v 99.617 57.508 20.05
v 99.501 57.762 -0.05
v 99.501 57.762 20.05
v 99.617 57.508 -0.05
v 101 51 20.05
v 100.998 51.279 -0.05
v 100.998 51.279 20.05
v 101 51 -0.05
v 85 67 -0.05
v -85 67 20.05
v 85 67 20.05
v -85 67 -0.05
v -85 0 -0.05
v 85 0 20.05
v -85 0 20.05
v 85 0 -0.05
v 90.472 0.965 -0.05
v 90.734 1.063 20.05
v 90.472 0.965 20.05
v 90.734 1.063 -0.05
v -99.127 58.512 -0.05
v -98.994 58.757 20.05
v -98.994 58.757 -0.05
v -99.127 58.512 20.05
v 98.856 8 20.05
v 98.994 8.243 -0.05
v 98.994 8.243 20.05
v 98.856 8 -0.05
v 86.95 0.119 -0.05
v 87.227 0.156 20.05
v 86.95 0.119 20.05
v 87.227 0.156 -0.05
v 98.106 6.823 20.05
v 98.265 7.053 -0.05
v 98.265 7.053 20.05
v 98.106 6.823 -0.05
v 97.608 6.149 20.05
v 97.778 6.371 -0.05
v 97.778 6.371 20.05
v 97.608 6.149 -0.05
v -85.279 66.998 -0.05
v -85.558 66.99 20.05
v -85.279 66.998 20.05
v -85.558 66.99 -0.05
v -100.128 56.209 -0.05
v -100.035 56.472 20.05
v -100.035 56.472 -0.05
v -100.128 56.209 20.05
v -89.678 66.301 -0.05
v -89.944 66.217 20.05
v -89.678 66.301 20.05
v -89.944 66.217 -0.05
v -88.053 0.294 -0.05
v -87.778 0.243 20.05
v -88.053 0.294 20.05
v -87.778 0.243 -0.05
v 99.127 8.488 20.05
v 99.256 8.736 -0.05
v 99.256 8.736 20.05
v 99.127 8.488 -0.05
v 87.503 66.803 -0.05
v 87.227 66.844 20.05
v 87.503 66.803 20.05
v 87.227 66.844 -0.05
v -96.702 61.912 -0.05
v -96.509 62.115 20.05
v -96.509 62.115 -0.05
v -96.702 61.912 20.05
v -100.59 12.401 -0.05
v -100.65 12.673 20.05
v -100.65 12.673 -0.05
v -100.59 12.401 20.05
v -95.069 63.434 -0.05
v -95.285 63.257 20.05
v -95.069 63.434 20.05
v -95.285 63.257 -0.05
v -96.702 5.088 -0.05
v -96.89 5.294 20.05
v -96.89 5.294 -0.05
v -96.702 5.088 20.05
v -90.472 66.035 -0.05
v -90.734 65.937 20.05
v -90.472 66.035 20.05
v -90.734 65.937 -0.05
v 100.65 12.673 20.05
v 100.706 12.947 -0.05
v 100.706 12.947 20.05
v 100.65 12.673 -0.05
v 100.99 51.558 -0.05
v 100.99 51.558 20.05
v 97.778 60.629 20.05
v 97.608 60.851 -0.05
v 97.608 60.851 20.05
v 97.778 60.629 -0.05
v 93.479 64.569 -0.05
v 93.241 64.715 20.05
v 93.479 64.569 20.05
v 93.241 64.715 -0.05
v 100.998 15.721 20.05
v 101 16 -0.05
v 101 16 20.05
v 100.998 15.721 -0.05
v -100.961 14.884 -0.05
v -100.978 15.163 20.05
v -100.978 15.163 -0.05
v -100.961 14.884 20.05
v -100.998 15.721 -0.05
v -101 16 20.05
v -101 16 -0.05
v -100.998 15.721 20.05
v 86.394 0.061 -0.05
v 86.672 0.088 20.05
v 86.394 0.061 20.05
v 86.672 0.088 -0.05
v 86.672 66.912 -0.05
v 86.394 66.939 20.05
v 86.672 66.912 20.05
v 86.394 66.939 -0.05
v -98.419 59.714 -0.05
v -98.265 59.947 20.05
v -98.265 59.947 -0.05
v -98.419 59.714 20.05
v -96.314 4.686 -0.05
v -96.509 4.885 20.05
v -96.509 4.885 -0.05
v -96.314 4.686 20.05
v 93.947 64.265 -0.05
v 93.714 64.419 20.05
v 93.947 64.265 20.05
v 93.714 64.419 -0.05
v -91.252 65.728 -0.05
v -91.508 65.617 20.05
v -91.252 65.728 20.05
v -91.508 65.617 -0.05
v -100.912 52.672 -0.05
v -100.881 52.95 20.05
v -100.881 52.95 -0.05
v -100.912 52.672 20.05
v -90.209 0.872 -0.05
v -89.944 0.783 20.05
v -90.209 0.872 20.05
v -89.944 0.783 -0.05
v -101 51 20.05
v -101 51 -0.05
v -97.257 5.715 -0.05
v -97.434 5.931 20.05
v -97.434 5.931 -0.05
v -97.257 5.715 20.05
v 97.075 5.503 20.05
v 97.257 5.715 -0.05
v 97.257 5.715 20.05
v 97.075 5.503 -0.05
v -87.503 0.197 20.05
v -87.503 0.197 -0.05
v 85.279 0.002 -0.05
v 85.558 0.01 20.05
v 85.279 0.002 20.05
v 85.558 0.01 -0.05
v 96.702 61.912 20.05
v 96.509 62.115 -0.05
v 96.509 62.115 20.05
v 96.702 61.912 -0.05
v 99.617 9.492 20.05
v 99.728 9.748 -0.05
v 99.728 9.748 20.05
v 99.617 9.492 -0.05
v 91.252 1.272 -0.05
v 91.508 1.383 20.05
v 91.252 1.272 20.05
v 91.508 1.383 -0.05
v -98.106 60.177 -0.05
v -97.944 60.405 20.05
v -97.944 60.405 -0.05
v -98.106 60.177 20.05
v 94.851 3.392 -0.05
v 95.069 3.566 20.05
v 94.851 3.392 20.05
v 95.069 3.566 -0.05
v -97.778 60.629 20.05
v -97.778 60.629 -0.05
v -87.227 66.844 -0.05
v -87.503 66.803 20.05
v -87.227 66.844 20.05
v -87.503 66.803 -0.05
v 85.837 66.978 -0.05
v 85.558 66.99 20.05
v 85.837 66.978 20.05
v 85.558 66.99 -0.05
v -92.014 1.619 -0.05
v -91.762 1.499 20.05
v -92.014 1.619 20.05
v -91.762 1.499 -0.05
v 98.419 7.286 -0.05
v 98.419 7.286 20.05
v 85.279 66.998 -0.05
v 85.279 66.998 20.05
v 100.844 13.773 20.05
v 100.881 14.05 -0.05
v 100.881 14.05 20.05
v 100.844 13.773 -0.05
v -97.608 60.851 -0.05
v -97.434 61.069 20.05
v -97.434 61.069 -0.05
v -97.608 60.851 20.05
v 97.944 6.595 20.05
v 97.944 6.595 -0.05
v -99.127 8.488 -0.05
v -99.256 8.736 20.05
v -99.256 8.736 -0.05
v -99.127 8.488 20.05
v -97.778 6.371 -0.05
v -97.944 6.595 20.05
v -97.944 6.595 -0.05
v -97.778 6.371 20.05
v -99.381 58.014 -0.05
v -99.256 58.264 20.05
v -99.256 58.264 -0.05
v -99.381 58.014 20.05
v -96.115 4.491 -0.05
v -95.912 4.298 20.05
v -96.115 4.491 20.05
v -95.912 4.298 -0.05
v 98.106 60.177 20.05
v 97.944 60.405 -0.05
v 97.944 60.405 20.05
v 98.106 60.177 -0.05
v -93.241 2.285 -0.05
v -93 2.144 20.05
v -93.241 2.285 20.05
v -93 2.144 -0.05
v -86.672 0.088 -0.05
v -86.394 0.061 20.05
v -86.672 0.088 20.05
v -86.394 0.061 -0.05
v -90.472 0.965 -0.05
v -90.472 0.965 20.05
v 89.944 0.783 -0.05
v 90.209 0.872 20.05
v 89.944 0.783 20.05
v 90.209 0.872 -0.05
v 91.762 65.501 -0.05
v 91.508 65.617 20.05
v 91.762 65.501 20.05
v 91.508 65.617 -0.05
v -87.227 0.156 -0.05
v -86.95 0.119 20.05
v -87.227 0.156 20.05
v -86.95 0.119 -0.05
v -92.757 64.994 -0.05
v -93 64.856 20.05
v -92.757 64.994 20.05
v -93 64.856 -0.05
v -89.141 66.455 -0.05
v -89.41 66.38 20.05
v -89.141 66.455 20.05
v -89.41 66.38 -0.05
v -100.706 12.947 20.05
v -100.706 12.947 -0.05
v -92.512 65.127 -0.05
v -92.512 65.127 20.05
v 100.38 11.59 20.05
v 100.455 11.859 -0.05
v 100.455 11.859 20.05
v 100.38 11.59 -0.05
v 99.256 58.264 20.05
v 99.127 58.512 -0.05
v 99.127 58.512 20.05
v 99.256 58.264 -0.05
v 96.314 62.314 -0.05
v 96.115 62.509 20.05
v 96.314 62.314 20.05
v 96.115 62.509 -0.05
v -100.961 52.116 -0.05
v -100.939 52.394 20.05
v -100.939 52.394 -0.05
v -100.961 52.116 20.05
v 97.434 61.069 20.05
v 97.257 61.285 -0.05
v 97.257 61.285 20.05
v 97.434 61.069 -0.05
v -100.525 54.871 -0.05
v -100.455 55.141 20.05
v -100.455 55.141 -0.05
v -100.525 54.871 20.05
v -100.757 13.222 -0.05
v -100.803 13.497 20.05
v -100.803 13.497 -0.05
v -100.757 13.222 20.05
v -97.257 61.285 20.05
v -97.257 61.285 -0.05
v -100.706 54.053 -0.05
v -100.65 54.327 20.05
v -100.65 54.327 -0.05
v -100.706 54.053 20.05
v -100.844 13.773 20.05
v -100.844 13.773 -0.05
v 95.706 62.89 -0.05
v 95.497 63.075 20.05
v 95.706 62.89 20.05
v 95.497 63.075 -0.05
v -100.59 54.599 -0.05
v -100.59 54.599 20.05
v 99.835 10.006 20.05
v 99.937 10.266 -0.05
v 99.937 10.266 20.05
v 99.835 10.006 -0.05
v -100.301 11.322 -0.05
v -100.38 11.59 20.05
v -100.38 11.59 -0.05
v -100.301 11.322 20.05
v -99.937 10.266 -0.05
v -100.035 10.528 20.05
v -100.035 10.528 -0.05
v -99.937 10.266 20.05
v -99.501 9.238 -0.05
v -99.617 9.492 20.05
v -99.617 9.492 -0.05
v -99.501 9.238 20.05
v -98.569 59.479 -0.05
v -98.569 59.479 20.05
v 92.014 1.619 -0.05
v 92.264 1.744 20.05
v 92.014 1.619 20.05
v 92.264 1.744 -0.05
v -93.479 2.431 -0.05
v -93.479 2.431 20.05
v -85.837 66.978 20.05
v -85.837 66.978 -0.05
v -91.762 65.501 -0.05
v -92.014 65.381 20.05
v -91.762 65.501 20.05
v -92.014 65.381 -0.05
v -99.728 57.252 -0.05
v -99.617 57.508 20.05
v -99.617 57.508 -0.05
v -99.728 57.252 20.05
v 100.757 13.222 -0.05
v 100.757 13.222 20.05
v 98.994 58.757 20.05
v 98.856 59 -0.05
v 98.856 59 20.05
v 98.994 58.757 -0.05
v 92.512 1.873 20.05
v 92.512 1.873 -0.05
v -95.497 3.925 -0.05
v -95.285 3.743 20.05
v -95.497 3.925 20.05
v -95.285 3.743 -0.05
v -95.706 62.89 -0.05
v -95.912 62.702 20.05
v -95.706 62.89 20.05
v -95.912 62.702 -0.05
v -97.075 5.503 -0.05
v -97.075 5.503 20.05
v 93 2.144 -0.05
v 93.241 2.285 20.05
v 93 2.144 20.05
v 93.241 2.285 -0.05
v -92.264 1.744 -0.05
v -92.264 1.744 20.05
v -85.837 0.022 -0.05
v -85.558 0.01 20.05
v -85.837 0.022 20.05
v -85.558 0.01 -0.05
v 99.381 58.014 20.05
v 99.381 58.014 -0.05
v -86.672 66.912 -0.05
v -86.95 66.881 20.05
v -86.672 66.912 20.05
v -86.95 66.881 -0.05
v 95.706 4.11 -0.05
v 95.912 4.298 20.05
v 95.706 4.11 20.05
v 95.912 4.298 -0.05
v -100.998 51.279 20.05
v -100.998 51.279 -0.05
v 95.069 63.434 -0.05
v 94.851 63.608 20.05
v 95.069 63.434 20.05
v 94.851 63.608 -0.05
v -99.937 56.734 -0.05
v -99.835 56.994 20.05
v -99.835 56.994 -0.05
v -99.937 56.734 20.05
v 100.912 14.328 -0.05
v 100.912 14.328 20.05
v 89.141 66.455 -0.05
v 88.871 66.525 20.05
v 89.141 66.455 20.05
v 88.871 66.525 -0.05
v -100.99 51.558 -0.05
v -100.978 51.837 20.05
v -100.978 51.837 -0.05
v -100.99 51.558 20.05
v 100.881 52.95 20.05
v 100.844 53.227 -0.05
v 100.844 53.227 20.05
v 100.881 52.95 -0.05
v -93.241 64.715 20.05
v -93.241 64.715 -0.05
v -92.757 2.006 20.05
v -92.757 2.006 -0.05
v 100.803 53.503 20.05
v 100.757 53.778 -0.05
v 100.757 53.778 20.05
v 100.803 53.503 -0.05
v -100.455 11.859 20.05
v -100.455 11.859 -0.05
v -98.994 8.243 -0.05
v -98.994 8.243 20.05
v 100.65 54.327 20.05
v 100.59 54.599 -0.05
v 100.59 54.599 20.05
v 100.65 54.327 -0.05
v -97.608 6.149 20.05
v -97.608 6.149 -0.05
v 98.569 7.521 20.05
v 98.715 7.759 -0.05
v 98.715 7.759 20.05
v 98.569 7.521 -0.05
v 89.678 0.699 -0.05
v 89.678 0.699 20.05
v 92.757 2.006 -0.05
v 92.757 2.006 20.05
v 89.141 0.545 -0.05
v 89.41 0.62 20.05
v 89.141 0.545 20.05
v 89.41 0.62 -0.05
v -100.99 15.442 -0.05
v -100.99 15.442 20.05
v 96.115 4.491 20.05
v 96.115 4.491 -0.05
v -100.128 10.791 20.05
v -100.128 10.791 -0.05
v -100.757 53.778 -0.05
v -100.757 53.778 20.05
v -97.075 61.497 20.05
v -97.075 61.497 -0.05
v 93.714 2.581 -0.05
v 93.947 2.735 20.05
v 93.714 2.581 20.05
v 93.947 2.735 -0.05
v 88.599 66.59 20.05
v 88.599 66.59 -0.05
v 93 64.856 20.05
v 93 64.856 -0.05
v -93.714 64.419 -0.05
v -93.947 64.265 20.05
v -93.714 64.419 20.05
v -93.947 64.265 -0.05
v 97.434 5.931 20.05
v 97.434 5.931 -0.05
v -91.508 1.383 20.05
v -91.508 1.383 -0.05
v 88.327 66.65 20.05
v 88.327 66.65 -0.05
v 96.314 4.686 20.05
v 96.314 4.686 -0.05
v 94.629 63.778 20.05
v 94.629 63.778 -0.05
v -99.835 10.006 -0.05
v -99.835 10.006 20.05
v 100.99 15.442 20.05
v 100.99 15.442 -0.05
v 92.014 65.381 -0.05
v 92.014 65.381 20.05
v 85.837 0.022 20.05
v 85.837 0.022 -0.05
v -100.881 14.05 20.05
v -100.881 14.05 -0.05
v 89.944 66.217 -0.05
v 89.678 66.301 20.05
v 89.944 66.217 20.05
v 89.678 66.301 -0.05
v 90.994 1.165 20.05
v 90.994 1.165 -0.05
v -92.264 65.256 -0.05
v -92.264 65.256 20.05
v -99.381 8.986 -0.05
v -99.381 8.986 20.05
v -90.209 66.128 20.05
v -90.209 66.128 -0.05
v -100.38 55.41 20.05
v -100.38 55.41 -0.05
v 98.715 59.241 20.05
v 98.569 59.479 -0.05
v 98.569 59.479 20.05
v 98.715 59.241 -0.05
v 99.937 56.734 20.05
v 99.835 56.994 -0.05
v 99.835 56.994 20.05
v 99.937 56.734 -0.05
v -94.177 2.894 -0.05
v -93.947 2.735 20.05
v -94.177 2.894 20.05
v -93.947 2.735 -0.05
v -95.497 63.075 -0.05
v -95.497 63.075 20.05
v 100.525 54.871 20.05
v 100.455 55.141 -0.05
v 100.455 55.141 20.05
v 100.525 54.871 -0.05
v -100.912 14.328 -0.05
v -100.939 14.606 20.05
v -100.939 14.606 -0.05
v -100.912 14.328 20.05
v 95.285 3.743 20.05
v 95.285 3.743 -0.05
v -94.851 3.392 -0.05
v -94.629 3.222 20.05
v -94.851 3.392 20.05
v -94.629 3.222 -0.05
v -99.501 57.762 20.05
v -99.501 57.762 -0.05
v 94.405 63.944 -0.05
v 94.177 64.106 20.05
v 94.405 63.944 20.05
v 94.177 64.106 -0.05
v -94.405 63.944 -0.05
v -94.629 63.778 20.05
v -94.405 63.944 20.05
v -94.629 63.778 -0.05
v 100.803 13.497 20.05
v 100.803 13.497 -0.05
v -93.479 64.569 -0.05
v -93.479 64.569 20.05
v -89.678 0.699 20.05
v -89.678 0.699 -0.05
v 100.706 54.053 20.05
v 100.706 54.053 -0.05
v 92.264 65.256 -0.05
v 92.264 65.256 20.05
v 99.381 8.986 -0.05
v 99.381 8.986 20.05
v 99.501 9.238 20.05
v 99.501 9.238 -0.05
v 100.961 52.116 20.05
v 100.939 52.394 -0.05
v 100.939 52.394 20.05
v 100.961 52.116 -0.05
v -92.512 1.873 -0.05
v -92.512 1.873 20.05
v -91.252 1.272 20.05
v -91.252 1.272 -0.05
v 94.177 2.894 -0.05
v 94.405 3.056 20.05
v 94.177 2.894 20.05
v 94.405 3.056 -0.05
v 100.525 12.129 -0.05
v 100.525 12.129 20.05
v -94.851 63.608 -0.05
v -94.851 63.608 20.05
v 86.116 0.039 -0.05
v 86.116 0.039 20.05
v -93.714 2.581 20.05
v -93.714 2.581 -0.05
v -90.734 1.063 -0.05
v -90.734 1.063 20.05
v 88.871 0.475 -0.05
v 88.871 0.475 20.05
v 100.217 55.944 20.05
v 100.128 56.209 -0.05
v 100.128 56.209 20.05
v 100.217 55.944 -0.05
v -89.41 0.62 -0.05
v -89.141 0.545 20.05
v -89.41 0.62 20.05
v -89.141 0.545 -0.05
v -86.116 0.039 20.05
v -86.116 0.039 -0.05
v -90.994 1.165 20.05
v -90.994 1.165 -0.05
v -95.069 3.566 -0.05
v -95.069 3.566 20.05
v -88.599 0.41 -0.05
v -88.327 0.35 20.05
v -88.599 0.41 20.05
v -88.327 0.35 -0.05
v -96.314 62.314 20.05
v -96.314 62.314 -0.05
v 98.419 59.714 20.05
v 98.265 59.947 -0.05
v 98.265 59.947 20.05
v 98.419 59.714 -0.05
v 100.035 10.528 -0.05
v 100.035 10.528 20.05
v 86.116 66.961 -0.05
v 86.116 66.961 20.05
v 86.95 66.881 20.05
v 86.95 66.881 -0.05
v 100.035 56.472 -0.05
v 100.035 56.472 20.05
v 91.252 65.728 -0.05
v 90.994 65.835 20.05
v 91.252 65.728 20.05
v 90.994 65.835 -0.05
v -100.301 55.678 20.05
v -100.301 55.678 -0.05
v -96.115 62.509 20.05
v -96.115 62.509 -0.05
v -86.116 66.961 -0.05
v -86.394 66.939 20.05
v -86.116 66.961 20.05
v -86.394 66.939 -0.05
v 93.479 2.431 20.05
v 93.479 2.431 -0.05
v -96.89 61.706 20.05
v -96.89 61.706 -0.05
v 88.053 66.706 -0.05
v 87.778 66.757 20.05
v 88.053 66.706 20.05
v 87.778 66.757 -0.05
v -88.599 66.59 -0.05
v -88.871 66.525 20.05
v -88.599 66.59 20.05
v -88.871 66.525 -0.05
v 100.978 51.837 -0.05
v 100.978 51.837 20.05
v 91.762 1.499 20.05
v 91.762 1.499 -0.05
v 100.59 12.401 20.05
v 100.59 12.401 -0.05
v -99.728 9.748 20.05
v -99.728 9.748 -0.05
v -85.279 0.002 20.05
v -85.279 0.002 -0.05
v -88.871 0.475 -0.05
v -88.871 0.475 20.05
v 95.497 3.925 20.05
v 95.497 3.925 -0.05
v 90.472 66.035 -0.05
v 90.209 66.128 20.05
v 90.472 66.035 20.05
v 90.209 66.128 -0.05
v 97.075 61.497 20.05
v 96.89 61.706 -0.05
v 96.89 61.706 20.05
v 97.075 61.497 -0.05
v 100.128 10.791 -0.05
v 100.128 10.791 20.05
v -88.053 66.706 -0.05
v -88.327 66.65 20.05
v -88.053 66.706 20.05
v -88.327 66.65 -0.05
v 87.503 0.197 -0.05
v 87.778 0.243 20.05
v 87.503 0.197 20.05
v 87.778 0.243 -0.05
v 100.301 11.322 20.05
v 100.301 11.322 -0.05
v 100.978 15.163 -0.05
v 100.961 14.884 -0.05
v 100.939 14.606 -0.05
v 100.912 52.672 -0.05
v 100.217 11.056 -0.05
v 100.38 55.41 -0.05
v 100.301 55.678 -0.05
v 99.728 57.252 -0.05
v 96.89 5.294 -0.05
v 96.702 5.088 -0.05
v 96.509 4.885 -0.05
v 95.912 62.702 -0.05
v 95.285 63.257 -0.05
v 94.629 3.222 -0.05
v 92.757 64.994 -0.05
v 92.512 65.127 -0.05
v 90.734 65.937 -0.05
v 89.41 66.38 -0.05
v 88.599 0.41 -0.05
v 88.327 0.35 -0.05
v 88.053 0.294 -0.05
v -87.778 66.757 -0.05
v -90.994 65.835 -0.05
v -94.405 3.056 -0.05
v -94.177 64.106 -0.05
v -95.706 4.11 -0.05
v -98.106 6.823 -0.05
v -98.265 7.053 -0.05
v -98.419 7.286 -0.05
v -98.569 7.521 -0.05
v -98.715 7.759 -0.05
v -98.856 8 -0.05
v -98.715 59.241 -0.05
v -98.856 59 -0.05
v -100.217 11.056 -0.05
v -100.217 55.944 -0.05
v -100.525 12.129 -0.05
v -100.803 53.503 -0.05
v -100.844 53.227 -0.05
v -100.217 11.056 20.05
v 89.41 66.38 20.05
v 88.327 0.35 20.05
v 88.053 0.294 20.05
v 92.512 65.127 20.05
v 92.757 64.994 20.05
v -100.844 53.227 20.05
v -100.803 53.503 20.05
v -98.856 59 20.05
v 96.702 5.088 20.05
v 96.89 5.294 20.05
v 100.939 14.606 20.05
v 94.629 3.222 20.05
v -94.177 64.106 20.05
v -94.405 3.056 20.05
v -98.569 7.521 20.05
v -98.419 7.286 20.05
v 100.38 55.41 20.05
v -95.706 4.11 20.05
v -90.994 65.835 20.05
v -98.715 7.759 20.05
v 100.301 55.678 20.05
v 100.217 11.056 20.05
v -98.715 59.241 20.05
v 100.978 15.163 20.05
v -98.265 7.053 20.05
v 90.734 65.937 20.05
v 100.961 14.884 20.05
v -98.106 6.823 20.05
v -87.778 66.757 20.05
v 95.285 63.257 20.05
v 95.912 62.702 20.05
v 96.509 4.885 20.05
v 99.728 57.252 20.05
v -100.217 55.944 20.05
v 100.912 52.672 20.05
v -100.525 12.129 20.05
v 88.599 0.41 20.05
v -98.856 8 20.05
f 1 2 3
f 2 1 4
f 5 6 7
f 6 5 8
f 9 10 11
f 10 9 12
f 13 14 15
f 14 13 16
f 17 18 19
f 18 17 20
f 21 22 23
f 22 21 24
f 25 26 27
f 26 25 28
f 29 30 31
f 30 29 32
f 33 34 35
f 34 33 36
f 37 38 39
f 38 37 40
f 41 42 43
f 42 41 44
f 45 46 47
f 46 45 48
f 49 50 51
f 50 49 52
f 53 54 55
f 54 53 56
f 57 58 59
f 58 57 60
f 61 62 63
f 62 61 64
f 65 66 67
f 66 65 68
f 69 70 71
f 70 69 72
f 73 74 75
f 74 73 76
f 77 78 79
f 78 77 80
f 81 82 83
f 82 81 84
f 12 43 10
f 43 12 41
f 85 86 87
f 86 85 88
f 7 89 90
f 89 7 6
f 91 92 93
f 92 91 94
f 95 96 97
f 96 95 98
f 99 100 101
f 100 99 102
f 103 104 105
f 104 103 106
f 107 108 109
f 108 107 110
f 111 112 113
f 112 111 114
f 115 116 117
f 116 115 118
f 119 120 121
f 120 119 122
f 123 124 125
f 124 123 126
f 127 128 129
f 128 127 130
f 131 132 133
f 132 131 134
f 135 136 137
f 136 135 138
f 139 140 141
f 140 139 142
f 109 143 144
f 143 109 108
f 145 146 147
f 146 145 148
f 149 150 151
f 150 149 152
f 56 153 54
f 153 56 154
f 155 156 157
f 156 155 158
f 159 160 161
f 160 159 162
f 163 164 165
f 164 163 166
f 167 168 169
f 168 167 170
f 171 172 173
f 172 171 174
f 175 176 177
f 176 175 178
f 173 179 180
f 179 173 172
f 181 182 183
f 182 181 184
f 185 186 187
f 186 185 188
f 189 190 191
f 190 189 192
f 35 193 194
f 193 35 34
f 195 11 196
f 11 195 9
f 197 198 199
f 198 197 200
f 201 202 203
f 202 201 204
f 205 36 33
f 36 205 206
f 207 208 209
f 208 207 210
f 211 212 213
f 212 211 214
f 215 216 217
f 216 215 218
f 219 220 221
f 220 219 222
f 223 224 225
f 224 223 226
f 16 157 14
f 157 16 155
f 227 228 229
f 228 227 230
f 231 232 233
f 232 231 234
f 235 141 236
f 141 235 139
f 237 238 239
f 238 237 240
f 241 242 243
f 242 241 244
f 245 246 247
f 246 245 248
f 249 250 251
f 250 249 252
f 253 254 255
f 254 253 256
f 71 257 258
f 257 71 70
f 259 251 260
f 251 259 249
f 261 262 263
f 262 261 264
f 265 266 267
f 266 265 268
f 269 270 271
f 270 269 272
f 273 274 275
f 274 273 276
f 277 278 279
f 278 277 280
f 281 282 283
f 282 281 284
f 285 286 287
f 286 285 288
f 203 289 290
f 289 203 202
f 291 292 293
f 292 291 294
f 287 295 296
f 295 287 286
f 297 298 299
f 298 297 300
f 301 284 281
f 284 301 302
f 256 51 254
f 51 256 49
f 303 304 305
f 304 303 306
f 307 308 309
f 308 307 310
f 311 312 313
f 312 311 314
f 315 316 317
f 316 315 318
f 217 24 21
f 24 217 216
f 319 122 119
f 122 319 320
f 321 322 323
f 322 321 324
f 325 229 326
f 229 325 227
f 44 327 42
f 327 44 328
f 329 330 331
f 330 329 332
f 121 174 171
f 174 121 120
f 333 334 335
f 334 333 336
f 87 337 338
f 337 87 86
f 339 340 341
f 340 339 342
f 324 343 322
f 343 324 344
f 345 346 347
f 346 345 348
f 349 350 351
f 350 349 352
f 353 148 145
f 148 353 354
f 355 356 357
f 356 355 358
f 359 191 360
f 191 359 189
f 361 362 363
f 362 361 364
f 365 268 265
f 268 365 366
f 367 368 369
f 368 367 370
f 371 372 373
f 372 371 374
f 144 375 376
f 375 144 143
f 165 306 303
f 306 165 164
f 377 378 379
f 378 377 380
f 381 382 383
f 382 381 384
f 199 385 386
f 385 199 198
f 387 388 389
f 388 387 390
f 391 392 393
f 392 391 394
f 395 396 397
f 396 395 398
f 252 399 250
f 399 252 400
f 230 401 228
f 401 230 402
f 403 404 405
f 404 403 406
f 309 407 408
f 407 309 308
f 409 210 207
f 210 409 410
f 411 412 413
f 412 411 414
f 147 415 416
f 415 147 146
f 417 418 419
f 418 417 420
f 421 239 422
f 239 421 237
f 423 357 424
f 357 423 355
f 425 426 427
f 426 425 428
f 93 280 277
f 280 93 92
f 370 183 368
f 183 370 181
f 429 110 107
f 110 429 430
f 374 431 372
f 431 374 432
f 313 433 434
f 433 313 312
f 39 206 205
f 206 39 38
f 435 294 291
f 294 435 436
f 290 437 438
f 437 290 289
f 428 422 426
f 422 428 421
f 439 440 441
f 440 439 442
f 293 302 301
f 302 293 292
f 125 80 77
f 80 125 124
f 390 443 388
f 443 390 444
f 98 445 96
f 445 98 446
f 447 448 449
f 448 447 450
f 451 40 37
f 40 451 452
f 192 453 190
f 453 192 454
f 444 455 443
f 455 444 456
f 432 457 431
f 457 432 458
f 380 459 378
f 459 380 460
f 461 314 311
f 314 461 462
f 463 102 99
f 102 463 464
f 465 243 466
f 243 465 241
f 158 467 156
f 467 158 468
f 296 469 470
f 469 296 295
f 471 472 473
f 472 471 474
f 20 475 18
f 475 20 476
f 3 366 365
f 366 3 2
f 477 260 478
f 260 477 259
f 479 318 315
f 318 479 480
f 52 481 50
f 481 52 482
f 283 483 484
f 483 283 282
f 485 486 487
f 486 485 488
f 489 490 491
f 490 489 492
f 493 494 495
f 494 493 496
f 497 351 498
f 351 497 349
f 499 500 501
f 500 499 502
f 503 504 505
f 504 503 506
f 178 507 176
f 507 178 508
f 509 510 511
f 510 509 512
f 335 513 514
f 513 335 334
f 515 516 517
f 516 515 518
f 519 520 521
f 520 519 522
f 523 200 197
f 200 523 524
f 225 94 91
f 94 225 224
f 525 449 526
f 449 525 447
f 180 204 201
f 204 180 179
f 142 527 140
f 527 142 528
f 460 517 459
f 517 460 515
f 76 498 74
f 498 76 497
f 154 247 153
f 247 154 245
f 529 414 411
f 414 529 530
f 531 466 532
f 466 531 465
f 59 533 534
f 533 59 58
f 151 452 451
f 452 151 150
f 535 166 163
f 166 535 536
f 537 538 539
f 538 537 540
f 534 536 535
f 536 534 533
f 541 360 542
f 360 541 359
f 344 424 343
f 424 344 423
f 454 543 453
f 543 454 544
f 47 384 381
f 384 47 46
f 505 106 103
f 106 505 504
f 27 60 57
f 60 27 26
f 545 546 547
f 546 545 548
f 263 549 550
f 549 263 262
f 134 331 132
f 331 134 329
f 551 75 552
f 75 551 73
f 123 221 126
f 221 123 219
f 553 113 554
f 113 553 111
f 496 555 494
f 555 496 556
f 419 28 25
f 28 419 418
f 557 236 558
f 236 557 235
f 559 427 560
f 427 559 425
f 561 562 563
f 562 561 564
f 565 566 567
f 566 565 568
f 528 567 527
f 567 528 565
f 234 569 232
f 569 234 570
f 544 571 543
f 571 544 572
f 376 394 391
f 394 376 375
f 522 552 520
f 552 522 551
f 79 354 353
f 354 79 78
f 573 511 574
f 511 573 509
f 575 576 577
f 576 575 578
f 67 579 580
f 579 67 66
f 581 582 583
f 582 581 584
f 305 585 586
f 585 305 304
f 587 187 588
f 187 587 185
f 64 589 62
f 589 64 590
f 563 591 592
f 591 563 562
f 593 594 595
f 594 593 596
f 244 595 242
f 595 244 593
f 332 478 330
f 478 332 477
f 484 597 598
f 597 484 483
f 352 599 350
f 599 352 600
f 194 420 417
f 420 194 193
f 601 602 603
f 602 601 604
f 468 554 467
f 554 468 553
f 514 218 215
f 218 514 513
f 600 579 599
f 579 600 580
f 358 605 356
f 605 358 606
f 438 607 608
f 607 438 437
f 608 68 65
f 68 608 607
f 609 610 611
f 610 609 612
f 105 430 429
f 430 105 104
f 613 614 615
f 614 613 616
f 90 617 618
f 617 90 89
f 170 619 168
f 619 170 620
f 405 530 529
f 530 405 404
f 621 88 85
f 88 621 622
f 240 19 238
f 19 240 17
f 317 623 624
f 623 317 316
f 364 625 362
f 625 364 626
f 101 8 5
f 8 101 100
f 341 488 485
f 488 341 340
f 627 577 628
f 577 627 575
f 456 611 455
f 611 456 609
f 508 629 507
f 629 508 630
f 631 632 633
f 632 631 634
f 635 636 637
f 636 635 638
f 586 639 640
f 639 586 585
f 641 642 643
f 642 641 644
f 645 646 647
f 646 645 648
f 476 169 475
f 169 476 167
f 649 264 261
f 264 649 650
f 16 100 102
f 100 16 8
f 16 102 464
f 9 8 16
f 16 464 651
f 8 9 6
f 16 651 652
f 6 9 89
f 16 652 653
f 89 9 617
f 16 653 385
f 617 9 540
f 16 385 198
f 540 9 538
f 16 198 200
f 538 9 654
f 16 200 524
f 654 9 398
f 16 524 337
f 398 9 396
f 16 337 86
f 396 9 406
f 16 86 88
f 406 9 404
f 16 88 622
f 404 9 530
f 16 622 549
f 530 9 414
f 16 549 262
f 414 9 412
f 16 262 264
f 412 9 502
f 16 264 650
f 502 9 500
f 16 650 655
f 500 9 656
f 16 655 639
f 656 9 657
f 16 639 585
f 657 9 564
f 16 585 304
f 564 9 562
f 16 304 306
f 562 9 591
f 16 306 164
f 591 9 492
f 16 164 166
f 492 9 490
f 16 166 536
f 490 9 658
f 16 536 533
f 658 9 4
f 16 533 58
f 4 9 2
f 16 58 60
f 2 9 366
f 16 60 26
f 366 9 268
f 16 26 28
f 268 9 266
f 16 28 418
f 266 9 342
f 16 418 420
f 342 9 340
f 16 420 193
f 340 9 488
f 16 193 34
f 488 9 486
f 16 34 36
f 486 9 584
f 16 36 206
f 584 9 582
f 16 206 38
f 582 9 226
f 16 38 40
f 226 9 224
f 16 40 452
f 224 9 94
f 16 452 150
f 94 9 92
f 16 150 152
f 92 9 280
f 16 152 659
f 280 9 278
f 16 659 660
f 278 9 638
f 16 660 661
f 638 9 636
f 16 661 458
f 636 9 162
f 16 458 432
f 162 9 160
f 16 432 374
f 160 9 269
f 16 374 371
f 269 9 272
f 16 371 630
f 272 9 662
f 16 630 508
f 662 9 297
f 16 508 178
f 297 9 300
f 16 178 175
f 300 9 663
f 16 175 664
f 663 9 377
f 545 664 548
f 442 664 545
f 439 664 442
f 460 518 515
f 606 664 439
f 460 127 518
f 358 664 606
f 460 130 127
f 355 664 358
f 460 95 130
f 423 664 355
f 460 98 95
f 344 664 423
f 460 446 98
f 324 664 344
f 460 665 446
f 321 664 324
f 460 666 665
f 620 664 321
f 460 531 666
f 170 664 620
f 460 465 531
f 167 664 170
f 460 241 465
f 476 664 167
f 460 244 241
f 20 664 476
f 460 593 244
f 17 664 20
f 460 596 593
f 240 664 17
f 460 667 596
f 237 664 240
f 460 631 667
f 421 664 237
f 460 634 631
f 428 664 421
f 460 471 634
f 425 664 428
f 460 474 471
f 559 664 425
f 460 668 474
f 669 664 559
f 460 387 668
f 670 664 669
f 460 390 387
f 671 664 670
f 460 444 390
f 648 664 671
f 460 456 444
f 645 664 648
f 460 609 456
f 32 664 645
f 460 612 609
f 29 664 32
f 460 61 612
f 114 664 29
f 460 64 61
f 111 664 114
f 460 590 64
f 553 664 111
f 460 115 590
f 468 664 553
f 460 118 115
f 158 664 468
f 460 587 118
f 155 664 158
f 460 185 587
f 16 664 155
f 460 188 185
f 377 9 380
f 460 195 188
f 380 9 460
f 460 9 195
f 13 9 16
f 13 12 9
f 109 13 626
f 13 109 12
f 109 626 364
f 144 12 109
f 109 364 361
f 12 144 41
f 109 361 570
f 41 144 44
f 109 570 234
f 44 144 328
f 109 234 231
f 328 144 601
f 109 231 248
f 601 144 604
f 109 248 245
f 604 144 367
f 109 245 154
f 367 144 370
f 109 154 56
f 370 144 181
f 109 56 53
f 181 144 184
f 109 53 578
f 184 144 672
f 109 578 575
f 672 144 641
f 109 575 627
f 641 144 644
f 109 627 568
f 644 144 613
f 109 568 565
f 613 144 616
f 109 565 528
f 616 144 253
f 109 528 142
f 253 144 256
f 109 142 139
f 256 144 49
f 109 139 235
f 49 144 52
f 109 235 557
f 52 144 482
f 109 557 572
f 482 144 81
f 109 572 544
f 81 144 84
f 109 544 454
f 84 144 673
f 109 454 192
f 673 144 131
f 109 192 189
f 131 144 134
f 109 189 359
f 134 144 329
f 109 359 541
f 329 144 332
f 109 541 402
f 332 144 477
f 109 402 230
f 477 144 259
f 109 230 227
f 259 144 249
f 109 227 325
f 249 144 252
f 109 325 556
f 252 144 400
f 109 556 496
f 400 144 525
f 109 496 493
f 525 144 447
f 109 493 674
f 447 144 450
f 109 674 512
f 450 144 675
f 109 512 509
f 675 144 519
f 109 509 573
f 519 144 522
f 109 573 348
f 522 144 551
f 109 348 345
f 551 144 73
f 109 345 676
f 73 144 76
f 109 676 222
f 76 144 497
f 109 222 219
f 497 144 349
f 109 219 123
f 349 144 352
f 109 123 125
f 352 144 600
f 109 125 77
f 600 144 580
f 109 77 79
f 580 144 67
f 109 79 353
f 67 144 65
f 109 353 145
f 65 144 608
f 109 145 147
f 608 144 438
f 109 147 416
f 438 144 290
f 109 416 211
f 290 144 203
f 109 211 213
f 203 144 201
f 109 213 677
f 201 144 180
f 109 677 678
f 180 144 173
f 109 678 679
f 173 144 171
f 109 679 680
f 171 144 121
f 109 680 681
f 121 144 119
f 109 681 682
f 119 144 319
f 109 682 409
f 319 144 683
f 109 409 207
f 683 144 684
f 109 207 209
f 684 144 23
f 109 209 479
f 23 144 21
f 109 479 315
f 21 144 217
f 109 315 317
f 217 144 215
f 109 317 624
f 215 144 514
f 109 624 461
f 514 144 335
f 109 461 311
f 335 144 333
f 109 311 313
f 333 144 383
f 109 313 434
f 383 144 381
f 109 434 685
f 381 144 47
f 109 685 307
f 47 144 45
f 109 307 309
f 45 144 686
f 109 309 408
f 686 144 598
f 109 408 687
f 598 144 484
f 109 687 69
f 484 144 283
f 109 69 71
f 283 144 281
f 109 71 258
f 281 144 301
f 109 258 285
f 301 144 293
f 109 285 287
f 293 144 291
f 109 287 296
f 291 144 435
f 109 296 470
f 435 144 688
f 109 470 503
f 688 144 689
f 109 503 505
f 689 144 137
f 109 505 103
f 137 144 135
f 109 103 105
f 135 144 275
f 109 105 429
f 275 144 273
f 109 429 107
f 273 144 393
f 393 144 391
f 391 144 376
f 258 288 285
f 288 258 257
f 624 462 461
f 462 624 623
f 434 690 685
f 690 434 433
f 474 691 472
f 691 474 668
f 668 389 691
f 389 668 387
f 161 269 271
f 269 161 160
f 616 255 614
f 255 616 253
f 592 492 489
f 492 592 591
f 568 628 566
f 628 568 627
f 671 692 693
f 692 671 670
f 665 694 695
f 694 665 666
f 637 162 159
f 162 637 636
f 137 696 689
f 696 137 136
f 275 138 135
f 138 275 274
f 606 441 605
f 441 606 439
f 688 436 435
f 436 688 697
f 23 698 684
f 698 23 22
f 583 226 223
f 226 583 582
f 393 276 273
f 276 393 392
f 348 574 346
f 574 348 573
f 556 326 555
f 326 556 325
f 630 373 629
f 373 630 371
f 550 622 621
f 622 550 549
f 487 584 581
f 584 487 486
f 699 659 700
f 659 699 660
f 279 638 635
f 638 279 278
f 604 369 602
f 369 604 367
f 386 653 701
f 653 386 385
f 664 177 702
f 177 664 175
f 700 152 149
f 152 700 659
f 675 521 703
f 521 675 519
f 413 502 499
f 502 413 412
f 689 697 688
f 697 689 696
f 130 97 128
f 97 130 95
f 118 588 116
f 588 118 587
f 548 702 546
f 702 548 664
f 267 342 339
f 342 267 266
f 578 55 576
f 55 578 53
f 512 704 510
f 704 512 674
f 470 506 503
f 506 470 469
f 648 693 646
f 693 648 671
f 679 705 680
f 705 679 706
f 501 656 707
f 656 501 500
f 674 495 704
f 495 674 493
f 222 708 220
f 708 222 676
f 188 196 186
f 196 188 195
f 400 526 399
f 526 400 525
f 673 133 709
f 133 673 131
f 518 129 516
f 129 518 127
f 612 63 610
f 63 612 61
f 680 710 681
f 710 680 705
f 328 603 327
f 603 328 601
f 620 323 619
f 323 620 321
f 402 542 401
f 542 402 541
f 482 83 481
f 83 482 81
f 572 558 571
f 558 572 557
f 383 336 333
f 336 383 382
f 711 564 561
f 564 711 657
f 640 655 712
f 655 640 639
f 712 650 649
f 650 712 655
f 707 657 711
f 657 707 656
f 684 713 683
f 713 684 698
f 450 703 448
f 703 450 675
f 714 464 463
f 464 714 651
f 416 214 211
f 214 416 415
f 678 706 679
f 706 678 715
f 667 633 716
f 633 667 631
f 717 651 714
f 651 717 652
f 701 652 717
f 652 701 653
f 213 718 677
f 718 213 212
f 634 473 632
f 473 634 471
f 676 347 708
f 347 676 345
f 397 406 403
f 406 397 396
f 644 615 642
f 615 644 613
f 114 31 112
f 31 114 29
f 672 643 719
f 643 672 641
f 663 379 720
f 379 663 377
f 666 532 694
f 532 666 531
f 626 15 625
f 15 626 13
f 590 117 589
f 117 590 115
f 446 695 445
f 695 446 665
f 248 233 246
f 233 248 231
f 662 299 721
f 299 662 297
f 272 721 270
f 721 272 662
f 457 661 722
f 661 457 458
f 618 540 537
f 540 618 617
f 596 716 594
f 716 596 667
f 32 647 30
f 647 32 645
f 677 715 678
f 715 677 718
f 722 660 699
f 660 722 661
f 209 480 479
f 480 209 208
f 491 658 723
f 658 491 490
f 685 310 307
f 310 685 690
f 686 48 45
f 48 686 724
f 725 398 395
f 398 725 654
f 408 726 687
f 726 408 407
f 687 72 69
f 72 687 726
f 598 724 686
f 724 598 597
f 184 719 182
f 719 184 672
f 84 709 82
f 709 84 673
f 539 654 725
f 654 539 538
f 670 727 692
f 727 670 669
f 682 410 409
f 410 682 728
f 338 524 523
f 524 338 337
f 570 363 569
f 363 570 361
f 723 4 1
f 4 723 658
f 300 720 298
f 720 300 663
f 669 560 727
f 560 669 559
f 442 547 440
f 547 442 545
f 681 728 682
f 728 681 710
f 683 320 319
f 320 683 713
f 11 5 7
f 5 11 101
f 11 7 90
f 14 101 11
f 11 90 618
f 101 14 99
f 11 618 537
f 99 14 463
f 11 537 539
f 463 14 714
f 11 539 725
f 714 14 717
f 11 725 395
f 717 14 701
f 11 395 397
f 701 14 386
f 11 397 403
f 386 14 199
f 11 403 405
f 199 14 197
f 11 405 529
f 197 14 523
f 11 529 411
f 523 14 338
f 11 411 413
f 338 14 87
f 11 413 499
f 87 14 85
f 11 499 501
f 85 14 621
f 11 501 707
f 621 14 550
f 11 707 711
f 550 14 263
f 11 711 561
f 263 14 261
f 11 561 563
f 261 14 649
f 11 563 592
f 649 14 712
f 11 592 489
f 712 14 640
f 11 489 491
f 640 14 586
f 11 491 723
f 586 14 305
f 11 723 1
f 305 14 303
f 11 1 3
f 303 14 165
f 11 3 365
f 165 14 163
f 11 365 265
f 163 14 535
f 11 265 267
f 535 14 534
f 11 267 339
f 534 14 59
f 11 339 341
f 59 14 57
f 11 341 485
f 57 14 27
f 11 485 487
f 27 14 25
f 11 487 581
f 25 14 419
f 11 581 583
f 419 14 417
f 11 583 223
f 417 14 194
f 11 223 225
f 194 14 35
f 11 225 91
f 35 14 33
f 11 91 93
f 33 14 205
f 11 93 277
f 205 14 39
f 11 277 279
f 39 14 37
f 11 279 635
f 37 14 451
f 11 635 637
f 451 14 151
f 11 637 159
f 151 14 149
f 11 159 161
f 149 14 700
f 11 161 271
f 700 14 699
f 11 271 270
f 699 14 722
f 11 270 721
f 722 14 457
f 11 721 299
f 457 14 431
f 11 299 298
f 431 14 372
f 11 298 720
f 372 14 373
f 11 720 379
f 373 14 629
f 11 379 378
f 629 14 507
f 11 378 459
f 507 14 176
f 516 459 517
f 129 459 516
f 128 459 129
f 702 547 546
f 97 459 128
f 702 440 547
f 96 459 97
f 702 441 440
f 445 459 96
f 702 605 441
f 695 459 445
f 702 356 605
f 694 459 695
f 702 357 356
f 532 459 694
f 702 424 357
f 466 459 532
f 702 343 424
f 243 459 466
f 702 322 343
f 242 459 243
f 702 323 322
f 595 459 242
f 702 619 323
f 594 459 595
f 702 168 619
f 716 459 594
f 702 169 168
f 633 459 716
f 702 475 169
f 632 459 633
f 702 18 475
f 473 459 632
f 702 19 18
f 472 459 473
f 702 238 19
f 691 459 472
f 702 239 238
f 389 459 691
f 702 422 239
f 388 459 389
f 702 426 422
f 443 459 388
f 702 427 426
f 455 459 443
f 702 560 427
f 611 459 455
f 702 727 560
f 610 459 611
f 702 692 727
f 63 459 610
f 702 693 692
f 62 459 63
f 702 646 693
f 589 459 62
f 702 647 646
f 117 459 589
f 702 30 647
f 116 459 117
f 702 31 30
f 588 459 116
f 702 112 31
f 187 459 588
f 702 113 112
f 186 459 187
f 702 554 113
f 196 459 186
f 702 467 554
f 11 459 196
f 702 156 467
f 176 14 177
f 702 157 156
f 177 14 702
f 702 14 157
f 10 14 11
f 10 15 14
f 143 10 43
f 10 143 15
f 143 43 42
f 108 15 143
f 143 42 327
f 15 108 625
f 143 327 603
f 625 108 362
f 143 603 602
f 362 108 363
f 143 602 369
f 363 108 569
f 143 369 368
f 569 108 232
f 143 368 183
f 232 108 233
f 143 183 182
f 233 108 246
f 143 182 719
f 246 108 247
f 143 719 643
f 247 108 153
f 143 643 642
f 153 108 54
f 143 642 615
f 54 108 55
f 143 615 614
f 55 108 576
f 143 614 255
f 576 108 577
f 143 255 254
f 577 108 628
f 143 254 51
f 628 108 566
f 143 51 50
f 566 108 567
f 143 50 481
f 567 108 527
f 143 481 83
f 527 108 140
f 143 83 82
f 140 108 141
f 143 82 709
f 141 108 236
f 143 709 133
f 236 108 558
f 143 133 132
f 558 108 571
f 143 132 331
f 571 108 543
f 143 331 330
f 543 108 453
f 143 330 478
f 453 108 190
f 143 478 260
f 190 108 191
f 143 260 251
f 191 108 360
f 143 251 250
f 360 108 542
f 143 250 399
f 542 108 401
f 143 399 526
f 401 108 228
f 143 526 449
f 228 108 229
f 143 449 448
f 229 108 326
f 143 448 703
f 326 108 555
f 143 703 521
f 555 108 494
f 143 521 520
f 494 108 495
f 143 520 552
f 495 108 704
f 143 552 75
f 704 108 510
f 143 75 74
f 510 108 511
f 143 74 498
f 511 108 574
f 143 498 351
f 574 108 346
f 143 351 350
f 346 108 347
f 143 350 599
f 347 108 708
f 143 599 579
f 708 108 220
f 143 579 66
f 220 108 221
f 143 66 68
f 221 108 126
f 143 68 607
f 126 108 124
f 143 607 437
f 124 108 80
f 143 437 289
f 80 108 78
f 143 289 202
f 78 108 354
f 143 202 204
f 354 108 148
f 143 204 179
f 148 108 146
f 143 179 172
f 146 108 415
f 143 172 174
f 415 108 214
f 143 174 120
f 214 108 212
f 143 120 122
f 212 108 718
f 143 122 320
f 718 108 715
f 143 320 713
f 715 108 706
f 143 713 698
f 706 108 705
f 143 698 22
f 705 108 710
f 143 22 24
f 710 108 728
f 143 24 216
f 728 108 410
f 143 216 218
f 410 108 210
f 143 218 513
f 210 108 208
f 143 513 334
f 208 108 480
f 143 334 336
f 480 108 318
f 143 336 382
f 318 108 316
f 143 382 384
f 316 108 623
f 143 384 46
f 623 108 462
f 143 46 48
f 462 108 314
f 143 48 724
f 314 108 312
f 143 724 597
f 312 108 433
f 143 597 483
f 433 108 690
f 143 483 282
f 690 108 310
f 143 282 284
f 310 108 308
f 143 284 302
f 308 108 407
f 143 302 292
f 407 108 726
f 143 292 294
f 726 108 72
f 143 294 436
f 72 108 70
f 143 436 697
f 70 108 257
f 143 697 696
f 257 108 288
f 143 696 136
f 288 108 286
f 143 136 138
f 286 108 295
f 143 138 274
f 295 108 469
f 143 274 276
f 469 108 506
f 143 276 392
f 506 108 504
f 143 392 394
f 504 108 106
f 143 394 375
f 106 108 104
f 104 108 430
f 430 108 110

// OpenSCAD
// file: common.scad
/*

    This program is free software: you can redistribute it and/or modify it under the terms of the GNU General Public License as published by the Free Software Foundation, either version 3 of the License, or (at your option) any later version.

    This program is distributed in the hope that it will be useful, but WITHOUT ANY WARRANTY; without even the implied warranty of MERCHANTABILITY or FITNESS FOR A PARTICULAR PURPOSE.  See the GNU General Public License for more details.

    You should have received a copy of the GNU General Public License along with this program.  If not, see <https://www.gnu.org/licenses/gpl-3.0.txt>
*/

/**********************
includes
**********************/


/**********************
globals
**********************/
e = (e == undef) ? 0.1 : e;
DEBUG = (DEBUG == undef) ? 0 : DEBUG;



/**********************
part modules
**********************/
module ring_arc(d_in, t, hgt, a=0, center=false, round_end=false) {
  /*
  param d_in: inner diameter of the ring
  param t: thickness of the ring
  param hgt: height of the ring
  param a: angle of the ring to cut out
  param center: bool
  param round_end: bool, should the cut ends of the ring be rounded?
  */
  d_out=d_in+2*t;
  tran = !center ? [d_out/2,d_out/2,0] : [0,0,0];
  translate(tran) {
    difference() {
      cylinder(h=hgt, d=d_out);
      
      translate([0,0,-e/2]) {
        cylinder(h=hgt+e, d=d_in);
        
        if (a>0) {
          hull () 
          for (i=[0,a]) {
            rotate([0,0,i]) cube([e,5*d_out,hgt+e]);
          }
        }
      }
    }
    
    // add rounded edges if we need them
    if (round_end) {
      for (i=[0,a]) {
        rotate([0,0,i])
        translate([0,d_in/2+(d_out-d_in)/4,0])
        cylinder(hgt, d=(d_out-d_in)/2, true);
      }
    }
  }
}

module cup (d_in, t, hgt, center=false) {
  /*
  param d_in: inner diameter of the cup
  param t: thickness of the floor and walls
  param hgt: height of the cup
  param center: bool, center the whole thing?
  */
  difference() {
    cylinder (h=hgt, r=d_in/2+t, center=center);
    translate([0,0,t]) cylinder (h=hgt, r=d_in/2, center=center);
  }
}

module r_fcube (size, rad, center=false) {
  /*
  flattened rounded cube - all of the edges around the z axis are rounded, the rest are square
  param size: [x,y,z] size
  parma rad: r for all corners [q1, q2, q3, q4] for the quandrant radii
  remember q1 is the positive x,y, q2 is +y, -x, ...
  */
  r = (len(rad) == undef) ?
        [for (i=[0:3]) minr(rad,size)] : [for (i=[0:3]) minr(rad[i], size)];
  tr = center ? [0,0,0] : size/2;
  q = [[+1, +1], [-1,1], [-1,-1], [1,-1]];
  translate(tr)
  hull () {
    for (i=[0:3]) {
      translate([q[i].x*size.x/2, q[i].y*size.y/2,0])
      if (r[i] == 0) {
        translate([-q[i].x*size.x/4, -q[i].y*size.y/4,0]) cube([size.x/2, size.y/2, size.z], center=true);
      } else {
        translate([-q[i].x*r[i],-q[i].y*r[i],0]) cylinder(h=size.z, r=r[i], center=true);
      }
    }
  }
}

function minr(r,size) = min(r, size.x/2, size.y/2);
// main file
/*

    This program is free software: you can redistribute it and/or modify it under the terms of the GNU General Public License as published by the Free Software Foundation, either version 3 of the License, or (at your option) any later version.

    This program is distributed in the hope that it will be useful, but WITHOUT ANY WARRANTY; without even the implied warranty of MERCHANTABILITY or FITNESS FOR A PARTICULAR PURPOSE.  See the GNU General Public License for more details.

    You should have received a copy of the GNU General Public License along with this program.  If not, see <https://www.gnu.org/licenses/gpl-3.0.txt>
*/

/**********************
includes
**********************/
include <common.scad>

/**********************
globals
**********************/
e = 0.1;
DEBUG=0;
diam=20;
t=4;
hgt=65;
soap_size = [75,210,20];
$fn= !DEBUG ? 360: 25;

// how long is the angled stub?
stub_l = 40;
// how far is the ring from the shower wall?
oset = 12.5;
// what is the angle of the stub?
stub_a = asin(oset/stub_l);
stub_h = sqrt(pow(stub_l,2)-pow(oset,2));

/**********************
renders
**********************/
rotate([0,0,90]) {
  difference () {
  //dish();
  group () {
  modifier(0);
  modifier(1);
  }
  }
}

/**********************
part modules
**********************/
module dish() {
  rotate([0,-90,0])
  ikea_interface();

  translate([-t,-soap_size.y/2,0])
    r_fcube(soap_size, 20);
}
module ikea_interface() {
  
  
  echo(stub_a);
  
  translate ([hgt,0,2*e-oset]) {
    
    // main ring
    rotate ([0,0,45])
    translate ([0,-diam-2*t,0]) {
      ring_arc(diam, t, t, a=90, round_end=true);  
      translate([0,(diam+2*t)/2,0]) r_fcube([t,t*2,t],[t,t,0,0]);
      translate([(diam+2*t)/2-2*t,diam+t,0]) r_fcube([2*t,t,t],[0,t,t,0]);
    }
    
    // arms from ring down to the soap dish
    for (i=[-1,1]) {
      
      translate([0,-t/2+i*t,0]) {
        // short stubs from ring down
        r_fcube ([2.2*t,t,t],[t,0,0,t]);
        
        // angled stubs
        rotate ([0,stub_a-90,0])
        cube ([t,t,stub_l]);
        
        //final stubs down towards the dish
        translate([-hgt,0,oset-2*e])
        cube([hgt-stub_h+t*sin(stub_a),t,t]);
      }
    }
  }
}

module modifier(id) {
  translate([0,t-soap_size.y/2,id*(soap_size.z/2)-e/2])
  r_fcube(soap_size-[2*t,2*t,soap_size.z/2-e],20-t);
}
